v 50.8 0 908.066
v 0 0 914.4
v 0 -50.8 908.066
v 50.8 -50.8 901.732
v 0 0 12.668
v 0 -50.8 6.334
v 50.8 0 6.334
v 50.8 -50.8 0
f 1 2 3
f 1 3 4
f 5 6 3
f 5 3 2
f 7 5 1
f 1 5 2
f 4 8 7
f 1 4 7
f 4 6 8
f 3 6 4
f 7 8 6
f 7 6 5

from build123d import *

# Parameters (mm, degrees)
F1_W     = 50.8
F1_H     = 914.4
F2_DEPTH = 50.8
F4_DEPTH = 38.1
F6_DEPTH = 38.1


with BuildPart() as f2:
    # F1 (on Right) → F2 (new body)
    with BuildSketch(Plane.YZ):
        with Locations((-25.4, 457.2)):
            Rectangle(F1_W, F1_H)
    extrude(amount=F2_DEPTH)

    # F3 (on face) → F4 (cut, symmetric)
    with BuildSketch(Plane(origin=(0, 0, 0), x_dir=(0.7071067812, -0.7071067812, 0), z_dir=(-0.7071067812, -0.7071067812, 0))):
        Polygon((71.8420489686, 914.4), (0, 914.4), (71.8420489686, 901.7323084175), align=None)
    extrude(amount=F4_DEPTH, both=True, mode=Mode.SUBTRACT)

    # F5 (on face) → F6 (cut, symmetric)
    with BuildSketch(Plane(origin=(0, 0, 0), x_dir=(0.7071067812, -0.7071067812, 0), z_dir=(-0.7071067812, -0.7071067812, 0))):
        Polygon((0, 12.6676915825), (0, 0), (71.8420489686, 0), align=None)
    extrude(amount=F6_DEPTH, both=True, mode=Mode.SUBTRACT)


solid = f2.part
